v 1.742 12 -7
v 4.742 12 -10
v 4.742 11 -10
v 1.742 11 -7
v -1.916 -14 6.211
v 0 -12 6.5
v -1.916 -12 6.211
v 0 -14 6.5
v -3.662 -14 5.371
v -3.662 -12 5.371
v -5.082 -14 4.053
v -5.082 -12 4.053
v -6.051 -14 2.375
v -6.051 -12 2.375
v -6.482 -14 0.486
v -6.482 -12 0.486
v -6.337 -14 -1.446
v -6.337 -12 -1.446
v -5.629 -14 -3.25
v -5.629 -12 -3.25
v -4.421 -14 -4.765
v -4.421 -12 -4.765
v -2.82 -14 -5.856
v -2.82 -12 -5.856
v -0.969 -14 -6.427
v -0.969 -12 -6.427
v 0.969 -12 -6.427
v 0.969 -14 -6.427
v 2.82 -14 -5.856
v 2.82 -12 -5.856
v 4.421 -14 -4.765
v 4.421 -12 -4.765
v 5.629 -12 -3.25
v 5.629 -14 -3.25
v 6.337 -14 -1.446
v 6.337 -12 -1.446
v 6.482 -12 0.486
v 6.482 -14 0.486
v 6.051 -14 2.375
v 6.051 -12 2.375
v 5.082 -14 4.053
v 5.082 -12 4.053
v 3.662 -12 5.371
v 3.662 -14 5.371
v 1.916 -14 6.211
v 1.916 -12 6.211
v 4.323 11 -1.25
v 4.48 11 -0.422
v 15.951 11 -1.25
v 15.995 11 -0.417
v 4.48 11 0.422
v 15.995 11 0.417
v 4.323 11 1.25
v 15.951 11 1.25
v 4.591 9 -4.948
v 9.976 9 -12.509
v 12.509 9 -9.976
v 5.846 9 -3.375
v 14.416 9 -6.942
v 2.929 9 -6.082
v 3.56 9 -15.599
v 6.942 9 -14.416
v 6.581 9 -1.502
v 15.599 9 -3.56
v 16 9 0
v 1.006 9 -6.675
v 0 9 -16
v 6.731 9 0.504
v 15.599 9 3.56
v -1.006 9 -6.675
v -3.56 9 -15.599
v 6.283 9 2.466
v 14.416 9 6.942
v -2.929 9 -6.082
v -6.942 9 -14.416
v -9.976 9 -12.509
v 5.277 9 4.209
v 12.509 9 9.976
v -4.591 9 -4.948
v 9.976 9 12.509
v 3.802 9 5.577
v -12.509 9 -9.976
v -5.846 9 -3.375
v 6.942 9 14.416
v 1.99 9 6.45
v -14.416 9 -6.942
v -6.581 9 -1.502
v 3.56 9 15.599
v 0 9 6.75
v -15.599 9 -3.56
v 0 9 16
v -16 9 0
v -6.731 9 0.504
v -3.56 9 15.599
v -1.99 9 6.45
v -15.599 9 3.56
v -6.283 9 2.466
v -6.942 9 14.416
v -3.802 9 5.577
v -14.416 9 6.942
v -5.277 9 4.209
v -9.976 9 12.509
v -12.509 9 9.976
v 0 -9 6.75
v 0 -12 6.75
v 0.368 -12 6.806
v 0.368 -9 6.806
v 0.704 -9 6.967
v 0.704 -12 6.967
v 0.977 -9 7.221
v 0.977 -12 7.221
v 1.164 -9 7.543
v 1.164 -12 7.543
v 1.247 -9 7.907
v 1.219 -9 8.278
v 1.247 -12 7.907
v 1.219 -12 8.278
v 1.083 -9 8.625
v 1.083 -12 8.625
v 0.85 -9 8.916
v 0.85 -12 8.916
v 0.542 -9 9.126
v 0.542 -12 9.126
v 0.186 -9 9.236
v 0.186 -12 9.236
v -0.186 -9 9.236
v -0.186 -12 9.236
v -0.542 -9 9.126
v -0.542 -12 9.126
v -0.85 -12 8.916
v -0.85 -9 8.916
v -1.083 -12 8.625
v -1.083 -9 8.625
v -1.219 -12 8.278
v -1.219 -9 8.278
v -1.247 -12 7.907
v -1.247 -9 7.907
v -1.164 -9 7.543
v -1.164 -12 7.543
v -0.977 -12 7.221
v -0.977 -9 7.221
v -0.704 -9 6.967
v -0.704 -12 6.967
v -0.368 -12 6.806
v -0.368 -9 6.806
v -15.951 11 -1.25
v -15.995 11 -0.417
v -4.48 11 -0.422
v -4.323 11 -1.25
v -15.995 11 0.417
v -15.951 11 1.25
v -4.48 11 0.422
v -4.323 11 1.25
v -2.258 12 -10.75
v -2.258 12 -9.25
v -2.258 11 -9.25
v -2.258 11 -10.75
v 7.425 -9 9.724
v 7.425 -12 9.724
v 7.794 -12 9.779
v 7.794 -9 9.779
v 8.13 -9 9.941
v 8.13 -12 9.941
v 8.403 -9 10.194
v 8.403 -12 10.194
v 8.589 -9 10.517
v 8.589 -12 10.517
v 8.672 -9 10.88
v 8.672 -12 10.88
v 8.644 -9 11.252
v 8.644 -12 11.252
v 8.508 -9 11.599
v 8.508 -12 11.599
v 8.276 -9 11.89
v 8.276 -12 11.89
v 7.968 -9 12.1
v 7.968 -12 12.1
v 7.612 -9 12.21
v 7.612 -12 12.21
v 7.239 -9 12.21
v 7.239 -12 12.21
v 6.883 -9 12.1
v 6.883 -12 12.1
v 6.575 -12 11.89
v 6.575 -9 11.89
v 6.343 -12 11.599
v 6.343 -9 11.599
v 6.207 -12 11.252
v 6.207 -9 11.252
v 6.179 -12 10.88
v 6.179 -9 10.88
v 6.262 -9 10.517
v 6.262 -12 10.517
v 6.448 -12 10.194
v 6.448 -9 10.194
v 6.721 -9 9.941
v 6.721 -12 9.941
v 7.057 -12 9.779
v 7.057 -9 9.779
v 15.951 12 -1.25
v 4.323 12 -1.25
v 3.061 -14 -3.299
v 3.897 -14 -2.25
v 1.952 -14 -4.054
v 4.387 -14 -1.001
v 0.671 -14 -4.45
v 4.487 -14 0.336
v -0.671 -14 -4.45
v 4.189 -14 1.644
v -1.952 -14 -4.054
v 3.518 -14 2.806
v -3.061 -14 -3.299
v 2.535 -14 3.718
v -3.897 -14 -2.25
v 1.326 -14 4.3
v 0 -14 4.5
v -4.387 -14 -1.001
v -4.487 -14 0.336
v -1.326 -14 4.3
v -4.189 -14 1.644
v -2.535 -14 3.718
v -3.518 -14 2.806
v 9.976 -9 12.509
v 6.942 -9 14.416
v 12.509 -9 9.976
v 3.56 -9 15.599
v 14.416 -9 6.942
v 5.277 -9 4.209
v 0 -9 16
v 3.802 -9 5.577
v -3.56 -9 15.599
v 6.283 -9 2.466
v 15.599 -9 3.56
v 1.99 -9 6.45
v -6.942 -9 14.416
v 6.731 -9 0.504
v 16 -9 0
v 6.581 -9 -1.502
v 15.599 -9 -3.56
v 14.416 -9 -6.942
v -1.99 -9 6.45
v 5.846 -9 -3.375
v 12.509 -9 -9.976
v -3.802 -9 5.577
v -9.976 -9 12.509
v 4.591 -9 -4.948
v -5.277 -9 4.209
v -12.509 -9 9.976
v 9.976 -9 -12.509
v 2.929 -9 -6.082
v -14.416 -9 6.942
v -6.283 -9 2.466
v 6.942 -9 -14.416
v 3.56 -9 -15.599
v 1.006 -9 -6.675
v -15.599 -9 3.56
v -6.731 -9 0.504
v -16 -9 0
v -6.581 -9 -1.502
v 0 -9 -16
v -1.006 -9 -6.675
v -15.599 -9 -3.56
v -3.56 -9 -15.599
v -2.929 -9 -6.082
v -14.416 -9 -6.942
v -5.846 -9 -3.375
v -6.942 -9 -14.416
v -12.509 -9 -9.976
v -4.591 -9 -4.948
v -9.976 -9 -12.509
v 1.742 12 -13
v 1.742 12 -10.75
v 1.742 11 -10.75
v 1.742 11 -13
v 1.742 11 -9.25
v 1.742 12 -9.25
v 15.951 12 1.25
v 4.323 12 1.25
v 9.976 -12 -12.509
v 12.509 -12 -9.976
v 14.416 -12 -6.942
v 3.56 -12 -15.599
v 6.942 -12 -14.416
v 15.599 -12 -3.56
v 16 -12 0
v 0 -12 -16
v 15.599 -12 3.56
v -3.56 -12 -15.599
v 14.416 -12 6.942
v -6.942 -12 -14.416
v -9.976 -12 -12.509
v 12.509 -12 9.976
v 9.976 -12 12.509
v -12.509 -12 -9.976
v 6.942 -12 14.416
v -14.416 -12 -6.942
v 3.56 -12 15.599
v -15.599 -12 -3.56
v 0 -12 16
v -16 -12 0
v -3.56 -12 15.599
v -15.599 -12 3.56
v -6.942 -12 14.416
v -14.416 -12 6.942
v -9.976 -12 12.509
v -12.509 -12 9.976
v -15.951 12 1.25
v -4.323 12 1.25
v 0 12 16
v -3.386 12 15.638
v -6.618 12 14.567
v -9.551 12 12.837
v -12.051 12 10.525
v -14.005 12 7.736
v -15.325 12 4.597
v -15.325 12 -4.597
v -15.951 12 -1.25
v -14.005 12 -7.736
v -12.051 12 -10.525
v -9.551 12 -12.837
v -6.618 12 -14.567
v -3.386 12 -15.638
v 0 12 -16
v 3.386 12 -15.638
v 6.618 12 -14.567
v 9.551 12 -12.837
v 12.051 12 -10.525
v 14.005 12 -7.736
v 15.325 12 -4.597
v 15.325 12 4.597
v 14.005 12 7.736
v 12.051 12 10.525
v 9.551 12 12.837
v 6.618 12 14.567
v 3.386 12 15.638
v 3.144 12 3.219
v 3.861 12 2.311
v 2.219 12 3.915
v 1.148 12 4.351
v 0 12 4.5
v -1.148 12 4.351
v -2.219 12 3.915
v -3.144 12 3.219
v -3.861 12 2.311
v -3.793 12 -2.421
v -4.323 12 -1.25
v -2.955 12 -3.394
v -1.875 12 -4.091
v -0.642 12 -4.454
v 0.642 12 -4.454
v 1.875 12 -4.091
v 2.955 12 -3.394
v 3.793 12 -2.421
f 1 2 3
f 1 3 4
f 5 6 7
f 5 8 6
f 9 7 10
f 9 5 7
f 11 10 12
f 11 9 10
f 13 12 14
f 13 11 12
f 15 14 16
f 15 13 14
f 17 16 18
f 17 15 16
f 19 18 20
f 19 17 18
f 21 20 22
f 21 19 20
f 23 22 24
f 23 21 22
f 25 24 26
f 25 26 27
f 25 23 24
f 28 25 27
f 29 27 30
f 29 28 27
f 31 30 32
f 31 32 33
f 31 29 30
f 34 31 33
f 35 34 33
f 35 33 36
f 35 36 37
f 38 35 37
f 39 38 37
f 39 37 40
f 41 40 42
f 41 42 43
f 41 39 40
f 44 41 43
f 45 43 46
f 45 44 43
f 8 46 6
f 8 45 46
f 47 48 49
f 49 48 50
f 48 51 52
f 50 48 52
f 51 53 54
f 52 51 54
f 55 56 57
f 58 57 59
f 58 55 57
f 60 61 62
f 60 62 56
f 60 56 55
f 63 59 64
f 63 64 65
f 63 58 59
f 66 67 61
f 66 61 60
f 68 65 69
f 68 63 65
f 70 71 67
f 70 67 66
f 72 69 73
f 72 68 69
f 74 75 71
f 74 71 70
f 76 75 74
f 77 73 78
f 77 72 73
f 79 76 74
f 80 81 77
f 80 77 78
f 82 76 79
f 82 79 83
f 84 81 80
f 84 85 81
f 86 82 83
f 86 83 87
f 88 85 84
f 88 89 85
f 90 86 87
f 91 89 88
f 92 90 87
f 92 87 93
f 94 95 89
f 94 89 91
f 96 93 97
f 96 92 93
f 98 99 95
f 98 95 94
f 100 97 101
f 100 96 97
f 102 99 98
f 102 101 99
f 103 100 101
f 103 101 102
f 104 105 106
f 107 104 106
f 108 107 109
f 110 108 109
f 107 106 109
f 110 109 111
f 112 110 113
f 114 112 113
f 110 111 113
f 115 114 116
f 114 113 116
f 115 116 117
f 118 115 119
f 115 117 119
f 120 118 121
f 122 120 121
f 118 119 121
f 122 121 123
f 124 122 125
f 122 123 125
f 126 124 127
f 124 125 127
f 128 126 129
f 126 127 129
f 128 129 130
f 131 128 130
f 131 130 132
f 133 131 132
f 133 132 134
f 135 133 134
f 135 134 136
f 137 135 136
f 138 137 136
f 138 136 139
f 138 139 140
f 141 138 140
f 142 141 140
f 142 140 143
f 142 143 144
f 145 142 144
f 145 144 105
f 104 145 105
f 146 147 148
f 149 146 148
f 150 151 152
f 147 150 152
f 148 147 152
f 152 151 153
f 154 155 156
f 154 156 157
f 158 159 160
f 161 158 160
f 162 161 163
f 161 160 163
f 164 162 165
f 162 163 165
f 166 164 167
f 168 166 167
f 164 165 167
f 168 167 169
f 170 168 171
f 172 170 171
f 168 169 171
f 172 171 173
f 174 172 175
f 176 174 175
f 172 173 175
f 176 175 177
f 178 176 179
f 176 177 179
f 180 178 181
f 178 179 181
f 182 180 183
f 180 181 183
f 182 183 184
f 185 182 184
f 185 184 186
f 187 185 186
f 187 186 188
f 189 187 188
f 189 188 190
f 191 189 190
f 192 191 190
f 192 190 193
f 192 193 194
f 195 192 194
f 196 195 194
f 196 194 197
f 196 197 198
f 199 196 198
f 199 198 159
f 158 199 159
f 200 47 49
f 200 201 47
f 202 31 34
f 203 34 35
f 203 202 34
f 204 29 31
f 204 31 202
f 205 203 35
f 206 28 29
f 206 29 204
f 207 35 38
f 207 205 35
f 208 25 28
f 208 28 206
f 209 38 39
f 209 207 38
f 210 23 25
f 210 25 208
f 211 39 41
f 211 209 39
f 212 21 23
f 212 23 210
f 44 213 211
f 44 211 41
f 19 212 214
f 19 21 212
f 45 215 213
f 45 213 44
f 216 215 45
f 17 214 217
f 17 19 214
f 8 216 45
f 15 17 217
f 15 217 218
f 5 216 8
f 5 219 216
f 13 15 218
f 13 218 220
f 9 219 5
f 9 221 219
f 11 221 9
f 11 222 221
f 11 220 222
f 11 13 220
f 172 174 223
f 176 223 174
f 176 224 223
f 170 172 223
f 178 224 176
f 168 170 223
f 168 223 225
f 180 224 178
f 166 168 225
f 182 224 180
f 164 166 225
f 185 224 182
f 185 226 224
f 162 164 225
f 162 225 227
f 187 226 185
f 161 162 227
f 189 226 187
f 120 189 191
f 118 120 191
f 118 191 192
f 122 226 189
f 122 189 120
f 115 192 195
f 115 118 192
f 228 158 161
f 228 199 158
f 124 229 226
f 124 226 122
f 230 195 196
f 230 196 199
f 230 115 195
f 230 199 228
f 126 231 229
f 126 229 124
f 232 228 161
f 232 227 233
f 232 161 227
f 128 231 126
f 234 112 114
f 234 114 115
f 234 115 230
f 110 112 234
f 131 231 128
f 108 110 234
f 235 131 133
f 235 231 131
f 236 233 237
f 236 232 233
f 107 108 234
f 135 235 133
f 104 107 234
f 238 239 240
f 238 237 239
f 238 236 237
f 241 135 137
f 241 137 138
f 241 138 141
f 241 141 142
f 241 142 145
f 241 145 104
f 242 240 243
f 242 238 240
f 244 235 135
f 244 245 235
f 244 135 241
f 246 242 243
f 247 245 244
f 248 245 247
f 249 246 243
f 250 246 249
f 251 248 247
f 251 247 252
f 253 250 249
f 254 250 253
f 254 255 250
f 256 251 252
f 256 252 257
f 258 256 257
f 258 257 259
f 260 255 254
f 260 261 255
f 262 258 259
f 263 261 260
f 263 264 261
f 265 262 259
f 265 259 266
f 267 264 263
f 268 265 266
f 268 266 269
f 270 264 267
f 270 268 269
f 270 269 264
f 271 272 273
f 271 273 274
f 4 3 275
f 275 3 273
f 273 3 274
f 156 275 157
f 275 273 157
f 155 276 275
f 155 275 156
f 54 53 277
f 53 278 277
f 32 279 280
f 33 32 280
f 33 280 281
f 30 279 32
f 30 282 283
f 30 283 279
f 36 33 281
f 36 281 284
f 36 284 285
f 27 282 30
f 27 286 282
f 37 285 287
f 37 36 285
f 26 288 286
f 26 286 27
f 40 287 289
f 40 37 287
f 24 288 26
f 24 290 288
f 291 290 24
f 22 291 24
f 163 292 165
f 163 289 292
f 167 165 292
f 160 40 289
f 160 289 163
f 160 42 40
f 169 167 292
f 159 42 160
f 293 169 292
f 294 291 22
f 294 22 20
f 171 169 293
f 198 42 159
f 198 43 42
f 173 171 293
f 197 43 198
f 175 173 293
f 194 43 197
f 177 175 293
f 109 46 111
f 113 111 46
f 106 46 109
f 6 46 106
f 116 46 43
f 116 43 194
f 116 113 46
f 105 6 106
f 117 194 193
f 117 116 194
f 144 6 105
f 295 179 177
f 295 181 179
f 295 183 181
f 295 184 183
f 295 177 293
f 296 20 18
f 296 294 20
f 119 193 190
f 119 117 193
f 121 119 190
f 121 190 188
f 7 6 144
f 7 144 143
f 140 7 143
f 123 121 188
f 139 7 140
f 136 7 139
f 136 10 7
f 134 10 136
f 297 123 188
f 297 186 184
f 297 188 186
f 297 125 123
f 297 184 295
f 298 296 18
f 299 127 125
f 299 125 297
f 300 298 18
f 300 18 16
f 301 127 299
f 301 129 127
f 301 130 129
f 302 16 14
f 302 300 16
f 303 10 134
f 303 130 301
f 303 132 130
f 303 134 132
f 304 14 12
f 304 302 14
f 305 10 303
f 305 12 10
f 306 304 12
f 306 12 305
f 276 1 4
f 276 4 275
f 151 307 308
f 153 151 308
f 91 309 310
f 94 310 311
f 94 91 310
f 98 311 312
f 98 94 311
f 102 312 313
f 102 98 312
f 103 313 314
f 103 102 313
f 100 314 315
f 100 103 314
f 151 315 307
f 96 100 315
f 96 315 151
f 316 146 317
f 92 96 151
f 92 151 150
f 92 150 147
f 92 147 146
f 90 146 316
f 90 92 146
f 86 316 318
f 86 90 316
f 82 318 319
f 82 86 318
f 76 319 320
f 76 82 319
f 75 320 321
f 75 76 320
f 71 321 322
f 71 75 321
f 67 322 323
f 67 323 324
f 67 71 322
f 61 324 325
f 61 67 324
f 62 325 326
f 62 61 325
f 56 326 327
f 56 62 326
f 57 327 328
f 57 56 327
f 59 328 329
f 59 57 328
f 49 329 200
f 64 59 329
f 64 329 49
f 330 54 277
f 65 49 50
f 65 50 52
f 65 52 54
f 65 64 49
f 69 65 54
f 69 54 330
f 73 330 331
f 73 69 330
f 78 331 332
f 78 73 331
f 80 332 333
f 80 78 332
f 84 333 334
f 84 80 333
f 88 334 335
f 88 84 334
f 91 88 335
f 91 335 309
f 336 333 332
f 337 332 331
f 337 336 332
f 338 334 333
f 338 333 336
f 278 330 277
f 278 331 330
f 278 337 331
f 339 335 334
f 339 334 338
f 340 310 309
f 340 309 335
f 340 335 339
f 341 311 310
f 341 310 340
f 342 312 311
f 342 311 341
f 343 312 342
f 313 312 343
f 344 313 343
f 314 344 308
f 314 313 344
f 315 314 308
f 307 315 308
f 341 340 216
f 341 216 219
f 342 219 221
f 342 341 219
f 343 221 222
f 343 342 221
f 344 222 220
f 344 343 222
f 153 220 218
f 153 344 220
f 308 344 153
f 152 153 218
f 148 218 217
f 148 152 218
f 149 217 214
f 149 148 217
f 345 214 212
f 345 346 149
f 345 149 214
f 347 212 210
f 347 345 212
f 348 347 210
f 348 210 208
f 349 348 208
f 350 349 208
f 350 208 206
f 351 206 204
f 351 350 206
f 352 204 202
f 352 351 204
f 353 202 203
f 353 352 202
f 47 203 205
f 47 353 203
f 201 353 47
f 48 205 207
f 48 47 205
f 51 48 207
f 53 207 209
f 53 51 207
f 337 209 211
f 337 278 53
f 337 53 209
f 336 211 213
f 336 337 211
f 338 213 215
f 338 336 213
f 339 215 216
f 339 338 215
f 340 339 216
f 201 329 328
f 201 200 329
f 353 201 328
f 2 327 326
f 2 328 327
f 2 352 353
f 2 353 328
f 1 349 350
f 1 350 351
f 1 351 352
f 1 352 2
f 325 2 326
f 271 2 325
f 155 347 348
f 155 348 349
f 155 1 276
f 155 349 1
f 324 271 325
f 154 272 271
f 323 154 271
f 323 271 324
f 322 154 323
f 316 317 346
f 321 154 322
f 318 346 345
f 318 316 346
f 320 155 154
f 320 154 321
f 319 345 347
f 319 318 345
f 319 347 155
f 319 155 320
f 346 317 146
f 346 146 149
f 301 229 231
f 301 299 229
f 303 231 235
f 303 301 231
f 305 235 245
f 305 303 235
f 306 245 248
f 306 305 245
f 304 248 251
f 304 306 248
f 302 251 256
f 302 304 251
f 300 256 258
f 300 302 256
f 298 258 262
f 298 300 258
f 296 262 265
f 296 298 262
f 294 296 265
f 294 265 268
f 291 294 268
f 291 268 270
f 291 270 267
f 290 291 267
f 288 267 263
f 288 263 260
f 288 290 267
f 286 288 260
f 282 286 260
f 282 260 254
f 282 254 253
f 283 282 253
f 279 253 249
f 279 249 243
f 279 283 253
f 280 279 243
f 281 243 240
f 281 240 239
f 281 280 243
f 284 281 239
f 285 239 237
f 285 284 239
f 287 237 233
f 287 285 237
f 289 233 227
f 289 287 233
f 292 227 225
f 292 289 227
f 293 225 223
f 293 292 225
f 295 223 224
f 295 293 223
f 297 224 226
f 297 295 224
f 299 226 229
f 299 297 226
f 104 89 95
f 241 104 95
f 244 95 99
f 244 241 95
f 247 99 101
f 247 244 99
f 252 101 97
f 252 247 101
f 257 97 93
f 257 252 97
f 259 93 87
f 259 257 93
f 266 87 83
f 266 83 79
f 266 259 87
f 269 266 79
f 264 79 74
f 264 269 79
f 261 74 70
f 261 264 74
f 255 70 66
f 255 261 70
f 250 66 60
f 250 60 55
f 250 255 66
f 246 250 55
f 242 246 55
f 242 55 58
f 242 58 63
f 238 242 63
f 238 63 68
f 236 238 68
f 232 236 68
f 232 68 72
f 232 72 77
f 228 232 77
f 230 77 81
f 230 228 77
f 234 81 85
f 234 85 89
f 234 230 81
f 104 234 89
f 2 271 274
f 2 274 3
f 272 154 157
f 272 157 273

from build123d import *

# Parameters (mm, degrees)
SKETCH3_R               = 1.25
CUT_EXTRUDE1_DEPTH      = 9
CUT_EXTRUDE2_DEPTH      = 1
CUT_EXTRUDE3_DEPTH      = 15
CUT_EXTRUDE3_DEPTH_BACK = 1
CUT_EXTRUDE3_START      = -40
SKETCH5_W               = 42.611665196
SKETCH5_H               = 2.5


with BuildPart() as part:
    # Sketch2 → Revolve1 (revolve)
    with BuildSketch(Plane(origin=(0, 0, 0), x_dir=(0, 0, -1), z_dir=(1, 0, 0))):
        Polygon((-16, 12), (-16, 9), (-6.75, 9), (-6.75, -9), (-16, -9), (-16, -12), (-6.5, -12), (-6.5, -14), (-4.5, -14), (-4.5, -12), (-4.5, 12), align=None)
    revolve(axis=Axis((0, 15.5, 0), (0, -1, 0)))

    # Sketch3 → Cut-Extrude1 (cut)
    with BuildSketch(Plane.XZ.offset(12)):
        with Locations(Location((0, 8, 0), (0, 0, 270))):
            Circle(SKETCH3_R)
        with Locations(Location((7.425425002, 10.973858189, 0), (0, 0, 270))):
            Circle(SKETCH3_R)
    extrude(amount=-CUT_EXTRUDE1_DEPTH, mode=Mode.SUBTRACT)

    # Sketch4 → Cut-Extrude2 (cut)
    with BuildSketch(Plane(origin=(0, 12, 0), x_dir=(1, 0, 0), z_dir=(0, 1, 0))):
        Polygon((-2.25827734, 10.75), (1.74172266, 10.75), (1.74172266, 13.000000233), (4.74172266, 10), (1.74172266, 7.000000233), (1.74172266, 9.25), (-2.25827734, 9.25), align=None)
    extrude(amount=-CUT_EXTRUDE2_DEPTH, mode=Mode.SUBTRACT)

    # Sketch5 → Cut-Extrude3 (cut, two sides: drawn at the far end of the back side and taken through both)
    with BuildSketch(Plane.XZ.offset(14).offset(CUT_EXTRUDE3_START - CUT_EXTRUDE3_DEPTH_BACK)):
        Rectangle(SKETCH5_W, SKETCH5_H)
    extrude(amount=CUT_EXTRUDE3_DEPTH + CUT_EXTRUDE3_DEPTH_BACK, mode=Mode.SUBTRACT)


solid = part.part
